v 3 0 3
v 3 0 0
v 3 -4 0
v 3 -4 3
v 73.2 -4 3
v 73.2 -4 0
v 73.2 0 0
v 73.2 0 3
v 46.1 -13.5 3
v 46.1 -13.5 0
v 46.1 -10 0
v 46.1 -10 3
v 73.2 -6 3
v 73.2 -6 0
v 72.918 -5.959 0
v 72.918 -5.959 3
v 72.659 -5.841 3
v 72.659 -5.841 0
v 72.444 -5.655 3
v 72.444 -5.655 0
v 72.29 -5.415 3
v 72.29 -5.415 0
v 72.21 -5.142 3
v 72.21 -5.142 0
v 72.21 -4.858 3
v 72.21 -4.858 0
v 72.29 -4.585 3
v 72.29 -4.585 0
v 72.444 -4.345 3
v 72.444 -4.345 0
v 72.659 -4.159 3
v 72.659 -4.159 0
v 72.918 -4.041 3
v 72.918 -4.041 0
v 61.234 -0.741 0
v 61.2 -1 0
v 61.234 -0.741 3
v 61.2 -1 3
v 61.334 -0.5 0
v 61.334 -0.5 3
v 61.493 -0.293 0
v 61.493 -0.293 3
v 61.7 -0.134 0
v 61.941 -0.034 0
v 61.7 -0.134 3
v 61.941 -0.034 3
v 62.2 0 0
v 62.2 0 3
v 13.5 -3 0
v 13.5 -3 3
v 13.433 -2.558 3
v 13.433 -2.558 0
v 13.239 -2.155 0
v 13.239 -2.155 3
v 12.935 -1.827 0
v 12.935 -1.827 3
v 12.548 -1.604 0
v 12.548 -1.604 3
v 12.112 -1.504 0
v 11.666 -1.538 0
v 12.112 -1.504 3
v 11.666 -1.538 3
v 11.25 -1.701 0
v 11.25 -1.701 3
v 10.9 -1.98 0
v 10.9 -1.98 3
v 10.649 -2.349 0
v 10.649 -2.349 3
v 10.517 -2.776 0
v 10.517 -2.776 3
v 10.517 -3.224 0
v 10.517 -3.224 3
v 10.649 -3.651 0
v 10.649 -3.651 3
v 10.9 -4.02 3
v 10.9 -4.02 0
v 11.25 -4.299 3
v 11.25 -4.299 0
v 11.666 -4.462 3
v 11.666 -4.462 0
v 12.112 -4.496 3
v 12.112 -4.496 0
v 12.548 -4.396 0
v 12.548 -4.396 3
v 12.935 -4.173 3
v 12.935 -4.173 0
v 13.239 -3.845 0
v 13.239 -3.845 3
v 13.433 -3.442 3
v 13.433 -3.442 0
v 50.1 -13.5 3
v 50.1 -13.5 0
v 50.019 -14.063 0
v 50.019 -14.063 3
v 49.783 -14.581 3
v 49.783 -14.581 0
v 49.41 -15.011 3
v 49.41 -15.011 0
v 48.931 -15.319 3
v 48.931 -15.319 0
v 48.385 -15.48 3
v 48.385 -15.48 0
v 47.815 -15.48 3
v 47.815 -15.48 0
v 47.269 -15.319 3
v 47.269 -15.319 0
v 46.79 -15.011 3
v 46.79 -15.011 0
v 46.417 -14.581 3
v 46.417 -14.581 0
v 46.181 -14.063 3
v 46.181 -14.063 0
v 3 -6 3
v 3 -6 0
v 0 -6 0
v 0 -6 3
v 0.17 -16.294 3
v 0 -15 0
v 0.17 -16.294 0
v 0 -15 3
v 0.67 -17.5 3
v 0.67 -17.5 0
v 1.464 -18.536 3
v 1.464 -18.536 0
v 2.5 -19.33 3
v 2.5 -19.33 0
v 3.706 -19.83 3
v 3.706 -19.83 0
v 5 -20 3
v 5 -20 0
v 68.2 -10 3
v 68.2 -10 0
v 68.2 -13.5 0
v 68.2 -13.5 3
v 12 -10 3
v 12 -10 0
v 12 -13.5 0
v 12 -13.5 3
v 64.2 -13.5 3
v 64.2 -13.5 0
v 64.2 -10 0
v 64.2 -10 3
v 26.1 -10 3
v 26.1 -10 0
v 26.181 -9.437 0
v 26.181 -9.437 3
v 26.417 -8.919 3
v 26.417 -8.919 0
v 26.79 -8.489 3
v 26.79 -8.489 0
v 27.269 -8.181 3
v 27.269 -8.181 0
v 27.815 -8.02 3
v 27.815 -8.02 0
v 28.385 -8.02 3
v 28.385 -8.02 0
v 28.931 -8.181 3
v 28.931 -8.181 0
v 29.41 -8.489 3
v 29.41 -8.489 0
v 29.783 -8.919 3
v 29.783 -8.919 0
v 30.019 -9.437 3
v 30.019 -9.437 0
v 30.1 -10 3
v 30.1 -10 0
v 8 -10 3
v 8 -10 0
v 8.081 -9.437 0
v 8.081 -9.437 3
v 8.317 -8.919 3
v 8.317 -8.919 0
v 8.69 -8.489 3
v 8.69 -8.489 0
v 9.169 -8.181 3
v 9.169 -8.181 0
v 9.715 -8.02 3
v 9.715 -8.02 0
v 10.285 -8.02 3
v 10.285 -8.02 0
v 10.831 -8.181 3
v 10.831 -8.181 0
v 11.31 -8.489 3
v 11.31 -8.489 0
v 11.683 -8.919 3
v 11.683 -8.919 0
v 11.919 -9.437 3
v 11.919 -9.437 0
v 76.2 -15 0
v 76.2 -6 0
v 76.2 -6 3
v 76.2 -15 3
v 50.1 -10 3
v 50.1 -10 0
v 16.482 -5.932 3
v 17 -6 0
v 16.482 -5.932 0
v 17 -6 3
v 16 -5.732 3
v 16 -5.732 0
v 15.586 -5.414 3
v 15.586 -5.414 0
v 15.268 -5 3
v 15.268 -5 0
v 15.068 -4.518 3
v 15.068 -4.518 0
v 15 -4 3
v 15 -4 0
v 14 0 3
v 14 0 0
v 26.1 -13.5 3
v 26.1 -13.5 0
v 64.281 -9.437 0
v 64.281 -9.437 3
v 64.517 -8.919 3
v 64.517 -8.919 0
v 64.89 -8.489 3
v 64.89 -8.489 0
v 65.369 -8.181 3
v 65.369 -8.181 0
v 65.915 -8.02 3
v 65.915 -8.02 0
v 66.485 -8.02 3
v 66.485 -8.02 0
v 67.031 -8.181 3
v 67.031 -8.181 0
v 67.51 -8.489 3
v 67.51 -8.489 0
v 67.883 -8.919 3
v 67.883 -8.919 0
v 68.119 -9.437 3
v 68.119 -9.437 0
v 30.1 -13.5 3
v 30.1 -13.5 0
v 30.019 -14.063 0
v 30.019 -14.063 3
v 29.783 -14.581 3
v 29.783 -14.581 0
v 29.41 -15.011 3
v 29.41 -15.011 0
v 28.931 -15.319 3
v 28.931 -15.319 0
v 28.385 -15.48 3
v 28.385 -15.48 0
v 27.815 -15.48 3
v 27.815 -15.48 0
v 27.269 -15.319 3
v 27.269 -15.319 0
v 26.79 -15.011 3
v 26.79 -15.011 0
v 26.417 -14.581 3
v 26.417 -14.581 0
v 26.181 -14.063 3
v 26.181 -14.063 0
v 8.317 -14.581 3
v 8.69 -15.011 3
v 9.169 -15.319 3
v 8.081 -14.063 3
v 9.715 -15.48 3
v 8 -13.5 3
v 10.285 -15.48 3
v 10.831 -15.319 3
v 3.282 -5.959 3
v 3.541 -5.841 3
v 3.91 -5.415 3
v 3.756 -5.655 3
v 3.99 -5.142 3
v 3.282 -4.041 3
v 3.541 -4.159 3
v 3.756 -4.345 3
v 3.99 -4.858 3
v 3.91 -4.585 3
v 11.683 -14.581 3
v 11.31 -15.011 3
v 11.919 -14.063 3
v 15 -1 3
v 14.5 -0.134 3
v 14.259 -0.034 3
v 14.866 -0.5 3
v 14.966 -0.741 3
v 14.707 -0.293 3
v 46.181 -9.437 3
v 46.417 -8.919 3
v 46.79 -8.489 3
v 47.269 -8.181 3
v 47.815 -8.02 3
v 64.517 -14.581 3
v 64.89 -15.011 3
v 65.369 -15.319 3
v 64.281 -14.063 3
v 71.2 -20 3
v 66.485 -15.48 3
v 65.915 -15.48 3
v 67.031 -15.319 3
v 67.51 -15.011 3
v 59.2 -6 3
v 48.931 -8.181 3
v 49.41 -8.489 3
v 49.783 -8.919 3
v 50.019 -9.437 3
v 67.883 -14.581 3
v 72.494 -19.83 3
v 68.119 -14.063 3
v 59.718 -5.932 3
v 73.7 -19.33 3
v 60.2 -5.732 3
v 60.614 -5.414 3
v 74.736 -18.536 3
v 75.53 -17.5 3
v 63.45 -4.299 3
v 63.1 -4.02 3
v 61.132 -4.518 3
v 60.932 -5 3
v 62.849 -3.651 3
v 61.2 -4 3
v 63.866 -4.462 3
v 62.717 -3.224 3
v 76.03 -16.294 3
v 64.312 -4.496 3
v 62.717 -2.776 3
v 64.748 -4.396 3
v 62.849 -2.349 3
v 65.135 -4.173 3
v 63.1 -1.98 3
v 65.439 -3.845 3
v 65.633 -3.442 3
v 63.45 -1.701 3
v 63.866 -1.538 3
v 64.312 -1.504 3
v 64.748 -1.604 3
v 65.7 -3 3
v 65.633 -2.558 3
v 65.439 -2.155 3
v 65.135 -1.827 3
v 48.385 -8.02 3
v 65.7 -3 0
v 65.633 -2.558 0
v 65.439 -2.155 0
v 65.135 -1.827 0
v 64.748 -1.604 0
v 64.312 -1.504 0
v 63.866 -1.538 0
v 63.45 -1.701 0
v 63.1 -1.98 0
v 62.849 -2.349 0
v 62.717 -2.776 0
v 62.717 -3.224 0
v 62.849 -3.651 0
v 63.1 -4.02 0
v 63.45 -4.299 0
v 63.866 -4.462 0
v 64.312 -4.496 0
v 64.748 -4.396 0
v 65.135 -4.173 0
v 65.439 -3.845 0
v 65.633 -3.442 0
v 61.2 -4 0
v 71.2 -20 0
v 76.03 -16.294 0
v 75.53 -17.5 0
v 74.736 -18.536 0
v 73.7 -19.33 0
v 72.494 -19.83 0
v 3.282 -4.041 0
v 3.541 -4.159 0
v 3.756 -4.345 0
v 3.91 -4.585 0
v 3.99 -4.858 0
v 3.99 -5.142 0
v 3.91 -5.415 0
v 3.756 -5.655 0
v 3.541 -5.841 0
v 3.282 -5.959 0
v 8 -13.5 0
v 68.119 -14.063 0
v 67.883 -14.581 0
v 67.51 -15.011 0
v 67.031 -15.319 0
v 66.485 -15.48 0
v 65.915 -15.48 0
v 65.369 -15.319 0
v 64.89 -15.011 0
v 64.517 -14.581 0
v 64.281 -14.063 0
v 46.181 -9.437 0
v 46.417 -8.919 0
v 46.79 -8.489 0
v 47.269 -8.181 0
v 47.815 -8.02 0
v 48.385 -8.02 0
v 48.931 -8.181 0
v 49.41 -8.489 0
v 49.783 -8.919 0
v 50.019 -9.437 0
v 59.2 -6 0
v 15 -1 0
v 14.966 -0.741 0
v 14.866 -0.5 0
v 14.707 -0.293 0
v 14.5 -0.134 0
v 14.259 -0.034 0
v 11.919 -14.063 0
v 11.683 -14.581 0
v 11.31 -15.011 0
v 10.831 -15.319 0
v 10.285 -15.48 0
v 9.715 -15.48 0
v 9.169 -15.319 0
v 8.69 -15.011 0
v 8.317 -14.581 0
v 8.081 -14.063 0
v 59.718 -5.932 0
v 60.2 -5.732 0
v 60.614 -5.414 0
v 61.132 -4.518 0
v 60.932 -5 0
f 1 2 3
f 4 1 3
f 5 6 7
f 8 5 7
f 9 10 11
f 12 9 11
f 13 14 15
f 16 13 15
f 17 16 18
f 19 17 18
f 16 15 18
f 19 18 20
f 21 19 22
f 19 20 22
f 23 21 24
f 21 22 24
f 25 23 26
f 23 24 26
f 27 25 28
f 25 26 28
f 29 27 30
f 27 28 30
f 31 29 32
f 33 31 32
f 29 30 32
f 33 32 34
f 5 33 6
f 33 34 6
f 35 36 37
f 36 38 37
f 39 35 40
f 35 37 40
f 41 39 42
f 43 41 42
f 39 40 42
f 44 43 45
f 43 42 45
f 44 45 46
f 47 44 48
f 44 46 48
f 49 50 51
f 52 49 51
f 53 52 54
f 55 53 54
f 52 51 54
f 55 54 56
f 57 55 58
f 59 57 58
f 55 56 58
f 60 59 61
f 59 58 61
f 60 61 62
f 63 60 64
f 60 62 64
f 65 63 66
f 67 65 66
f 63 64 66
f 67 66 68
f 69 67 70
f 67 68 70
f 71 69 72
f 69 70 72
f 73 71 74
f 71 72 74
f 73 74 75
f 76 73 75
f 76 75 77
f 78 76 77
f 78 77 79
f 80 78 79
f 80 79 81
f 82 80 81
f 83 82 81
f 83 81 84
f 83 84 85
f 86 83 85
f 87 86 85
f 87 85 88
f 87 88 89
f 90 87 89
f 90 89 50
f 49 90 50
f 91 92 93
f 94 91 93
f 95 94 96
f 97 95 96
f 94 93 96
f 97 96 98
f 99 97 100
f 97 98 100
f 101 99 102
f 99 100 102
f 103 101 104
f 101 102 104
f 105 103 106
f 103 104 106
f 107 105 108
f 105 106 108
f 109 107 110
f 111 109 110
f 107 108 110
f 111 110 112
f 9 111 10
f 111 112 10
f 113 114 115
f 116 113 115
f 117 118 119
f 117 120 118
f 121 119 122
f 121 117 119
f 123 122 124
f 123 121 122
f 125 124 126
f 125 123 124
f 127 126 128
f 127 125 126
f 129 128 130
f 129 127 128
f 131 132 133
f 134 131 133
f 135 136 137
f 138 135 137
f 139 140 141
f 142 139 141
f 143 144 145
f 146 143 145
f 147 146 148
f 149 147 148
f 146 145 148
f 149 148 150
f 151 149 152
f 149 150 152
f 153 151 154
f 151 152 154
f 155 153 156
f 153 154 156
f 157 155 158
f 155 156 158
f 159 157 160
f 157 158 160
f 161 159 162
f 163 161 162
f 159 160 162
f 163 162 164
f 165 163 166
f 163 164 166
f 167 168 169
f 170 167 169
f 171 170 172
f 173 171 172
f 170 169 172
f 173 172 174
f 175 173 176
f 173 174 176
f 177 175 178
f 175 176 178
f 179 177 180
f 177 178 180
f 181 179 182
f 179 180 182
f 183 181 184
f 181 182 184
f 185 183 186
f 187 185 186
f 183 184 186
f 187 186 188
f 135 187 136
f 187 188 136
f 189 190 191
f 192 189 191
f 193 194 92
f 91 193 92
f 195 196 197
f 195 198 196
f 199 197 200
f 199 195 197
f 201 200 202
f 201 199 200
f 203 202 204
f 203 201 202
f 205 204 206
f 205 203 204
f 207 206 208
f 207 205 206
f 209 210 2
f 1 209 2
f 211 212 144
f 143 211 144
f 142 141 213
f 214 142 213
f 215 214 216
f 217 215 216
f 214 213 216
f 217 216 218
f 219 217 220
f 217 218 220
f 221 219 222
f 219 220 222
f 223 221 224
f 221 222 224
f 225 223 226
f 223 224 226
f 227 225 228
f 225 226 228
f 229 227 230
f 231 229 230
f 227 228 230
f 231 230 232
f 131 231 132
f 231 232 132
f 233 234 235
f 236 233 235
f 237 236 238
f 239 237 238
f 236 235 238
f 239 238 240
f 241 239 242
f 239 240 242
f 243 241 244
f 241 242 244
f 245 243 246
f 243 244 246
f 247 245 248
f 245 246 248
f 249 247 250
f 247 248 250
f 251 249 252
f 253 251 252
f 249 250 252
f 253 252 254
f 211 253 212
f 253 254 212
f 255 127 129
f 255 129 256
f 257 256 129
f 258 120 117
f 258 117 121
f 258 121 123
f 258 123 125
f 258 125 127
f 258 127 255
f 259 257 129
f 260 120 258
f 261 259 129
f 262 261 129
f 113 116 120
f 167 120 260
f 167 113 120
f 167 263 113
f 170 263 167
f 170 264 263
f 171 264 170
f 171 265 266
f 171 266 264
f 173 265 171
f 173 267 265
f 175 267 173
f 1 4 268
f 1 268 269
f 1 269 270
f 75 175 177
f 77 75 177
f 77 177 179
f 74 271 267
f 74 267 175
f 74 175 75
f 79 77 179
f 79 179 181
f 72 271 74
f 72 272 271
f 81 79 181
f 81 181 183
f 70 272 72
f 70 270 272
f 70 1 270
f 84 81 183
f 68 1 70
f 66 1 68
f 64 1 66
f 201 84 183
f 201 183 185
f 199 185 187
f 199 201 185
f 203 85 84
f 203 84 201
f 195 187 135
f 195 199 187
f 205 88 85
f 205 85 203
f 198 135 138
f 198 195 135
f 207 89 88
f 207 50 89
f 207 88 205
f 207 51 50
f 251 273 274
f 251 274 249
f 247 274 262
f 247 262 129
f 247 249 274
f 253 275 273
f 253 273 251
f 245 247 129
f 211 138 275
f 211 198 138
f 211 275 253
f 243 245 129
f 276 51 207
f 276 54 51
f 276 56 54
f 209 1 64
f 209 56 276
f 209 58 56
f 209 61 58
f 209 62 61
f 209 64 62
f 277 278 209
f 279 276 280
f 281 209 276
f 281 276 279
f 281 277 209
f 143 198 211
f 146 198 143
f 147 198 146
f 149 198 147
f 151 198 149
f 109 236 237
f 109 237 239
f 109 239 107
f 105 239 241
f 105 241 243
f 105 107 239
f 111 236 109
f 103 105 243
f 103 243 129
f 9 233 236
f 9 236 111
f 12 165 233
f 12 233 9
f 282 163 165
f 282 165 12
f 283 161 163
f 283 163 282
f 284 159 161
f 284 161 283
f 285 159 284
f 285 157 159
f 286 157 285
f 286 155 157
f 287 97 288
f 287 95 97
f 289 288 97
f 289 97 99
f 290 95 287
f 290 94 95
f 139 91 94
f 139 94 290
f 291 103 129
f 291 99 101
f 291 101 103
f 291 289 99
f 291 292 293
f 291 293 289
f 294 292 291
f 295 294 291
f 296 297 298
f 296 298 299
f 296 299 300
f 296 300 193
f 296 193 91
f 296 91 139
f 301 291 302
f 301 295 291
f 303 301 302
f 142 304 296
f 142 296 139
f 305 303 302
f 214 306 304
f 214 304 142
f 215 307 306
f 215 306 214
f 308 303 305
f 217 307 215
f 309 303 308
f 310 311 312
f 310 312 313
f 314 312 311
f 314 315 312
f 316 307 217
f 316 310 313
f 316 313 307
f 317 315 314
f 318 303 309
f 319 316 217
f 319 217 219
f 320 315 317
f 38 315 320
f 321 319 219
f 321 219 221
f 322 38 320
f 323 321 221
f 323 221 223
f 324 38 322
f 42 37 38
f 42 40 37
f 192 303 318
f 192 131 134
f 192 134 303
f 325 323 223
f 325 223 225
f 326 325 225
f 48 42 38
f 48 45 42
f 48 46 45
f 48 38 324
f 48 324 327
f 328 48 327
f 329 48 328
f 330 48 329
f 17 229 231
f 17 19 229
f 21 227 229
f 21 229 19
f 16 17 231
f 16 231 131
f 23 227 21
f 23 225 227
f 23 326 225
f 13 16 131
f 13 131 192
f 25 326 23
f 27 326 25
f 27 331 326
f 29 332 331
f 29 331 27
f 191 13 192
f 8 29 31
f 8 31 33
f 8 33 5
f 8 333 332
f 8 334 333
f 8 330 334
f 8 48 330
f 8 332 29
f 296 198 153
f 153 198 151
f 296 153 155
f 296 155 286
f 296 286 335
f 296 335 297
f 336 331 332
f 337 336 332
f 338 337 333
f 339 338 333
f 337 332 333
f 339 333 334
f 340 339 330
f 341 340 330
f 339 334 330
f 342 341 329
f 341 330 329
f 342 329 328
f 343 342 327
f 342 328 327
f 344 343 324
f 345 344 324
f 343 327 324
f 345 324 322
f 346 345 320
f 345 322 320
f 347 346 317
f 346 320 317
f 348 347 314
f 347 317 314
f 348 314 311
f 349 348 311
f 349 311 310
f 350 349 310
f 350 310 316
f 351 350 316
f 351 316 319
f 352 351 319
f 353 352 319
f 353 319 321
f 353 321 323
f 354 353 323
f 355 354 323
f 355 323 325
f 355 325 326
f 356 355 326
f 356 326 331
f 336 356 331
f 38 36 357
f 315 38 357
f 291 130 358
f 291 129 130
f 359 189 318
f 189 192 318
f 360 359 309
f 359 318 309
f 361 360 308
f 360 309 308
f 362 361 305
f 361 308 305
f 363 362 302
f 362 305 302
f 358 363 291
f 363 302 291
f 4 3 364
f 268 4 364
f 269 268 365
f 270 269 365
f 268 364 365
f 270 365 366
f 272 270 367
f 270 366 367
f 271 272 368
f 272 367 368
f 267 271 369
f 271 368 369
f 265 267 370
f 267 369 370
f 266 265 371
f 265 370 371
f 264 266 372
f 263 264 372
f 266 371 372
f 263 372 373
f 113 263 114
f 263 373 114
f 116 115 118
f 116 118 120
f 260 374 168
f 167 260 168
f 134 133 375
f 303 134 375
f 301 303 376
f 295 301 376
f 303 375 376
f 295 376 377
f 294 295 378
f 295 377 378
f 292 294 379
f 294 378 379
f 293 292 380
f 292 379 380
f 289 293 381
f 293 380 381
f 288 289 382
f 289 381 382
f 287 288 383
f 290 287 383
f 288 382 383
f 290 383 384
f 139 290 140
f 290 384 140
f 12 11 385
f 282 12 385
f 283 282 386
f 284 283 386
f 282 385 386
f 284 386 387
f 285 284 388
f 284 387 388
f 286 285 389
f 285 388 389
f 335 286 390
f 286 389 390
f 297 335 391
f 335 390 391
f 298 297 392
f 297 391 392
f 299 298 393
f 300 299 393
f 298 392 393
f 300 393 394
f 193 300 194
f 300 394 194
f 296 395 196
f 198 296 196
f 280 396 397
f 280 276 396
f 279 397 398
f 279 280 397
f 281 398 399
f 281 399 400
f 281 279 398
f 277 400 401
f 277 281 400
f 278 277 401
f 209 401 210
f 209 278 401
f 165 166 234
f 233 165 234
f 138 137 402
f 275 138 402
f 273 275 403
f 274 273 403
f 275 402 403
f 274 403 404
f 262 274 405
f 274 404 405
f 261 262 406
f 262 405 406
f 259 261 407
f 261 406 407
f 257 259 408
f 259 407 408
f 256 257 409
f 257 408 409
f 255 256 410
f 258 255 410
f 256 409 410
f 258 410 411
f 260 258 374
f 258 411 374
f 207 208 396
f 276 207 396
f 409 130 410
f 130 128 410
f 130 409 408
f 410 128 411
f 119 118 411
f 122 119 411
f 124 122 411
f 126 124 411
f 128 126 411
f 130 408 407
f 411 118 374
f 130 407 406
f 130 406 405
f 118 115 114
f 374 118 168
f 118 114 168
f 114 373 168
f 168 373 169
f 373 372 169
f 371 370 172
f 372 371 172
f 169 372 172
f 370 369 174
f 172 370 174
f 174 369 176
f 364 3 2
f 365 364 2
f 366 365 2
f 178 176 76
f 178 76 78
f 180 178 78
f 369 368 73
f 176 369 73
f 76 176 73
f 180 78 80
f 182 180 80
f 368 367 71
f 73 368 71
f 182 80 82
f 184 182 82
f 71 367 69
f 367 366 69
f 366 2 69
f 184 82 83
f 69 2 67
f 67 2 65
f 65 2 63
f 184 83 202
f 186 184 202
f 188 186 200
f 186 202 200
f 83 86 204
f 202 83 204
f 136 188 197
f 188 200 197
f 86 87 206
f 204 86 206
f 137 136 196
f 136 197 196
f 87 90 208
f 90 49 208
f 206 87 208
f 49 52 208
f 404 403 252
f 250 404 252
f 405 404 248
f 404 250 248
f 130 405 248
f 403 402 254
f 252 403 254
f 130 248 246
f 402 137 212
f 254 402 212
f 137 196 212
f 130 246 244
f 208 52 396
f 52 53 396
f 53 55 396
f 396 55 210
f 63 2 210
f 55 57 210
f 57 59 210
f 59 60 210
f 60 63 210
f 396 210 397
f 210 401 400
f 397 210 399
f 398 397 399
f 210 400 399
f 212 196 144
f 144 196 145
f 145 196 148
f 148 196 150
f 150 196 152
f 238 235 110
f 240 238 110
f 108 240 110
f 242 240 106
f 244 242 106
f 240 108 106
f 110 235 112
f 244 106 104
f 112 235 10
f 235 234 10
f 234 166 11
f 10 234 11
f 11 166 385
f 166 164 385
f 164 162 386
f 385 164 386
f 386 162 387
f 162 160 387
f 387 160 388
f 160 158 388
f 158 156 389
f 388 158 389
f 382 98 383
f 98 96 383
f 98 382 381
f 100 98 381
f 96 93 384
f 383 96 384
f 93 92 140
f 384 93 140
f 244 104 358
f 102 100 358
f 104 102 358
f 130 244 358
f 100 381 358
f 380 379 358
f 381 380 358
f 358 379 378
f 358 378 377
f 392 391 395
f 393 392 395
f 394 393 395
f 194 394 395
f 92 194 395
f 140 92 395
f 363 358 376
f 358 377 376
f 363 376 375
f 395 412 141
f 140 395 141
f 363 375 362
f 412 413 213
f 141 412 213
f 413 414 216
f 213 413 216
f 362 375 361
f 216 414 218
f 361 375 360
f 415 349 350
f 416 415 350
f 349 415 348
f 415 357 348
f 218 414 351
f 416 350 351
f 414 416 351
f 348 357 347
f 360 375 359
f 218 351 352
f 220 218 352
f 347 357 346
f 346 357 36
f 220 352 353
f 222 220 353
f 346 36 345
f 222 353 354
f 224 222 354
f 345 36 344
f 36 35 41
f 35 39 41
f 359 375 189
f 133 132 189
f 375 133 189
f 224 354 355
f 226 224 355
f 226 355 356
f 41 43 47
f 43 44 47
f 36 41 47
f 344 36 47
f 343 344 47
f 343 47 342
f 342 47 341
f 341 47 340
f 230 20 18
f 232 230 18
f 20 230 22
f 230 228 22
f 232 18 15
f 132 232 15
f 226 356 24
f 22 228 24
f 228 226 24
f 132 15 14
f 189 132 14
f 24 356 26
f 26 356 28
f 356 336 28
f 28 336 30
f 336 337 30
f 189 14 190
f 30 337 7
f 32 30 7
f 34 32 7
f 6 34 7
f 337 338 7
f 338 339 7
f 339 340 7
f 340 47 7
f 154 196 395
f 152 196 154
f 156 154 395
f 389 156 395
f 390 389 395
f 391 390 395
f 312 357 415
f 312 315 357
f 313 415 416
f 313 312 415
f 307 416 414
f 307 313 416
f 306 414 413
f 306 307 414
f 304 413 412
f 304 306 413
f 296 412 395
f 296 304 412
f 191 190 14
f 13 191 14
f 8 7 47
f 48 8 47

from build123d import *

# Parameters (mm, degrees)
EXTRUDE_1_DEPTH     = 3
FILLET_1_R          = 2
SKETCH_2_R          = 1.5
CUT_EXTRUDE_1_DEPTH = 10
FILLET_3_R          = 1
SKETCH_3_W          = 76.2
SKETCH_3_H          = 3
EXTRUDE_2_DEPTH     = 3
FILLET_4_R          = 5


# Read off the part's stored shape, not the designer's step: 凸台-拉伸1
with BuildPart() as part:
    # 凸台-拉伸1 outline → 凸台-拉伸1 (new body)
    with BuildSketch(Plane.XY):
        with BuildLine():
            Line((76.2, -17), (76.2, -6))
            Line((76.2, -6), (73.2, -6))
            ThreePointArc((73.2, -6), (72.2, -5), (73.2, -4))
            Line((73.2, -4), (73.2, 0))
            Line((73.2, 0), (61.2, 0))
            Line((61.2, 0), (61.2, -6))
            Line((61.2, -6), (15, -6))
            Line((15, -6), (15, 0))
            Line((15, 0), (3, 0))
            Line((3, 0), (3, -4))
            ThreePointArc((3, -4), (4, -5), (3, -6))
            Line((3, -6), (0, -6))
            Line((0, -6), (0, -17))
            Line((0, -17), (76.2, -17))
        make_face()
        with BuildLine():
            Line((12, -10), (12, -13.5))
            ThreePointArc((12, -13.5), (10, -15.5), (8, -13.5))
            Line((8, -13.5), (8, -10))
            ThreePointArc((8, -10), (10, -8), (12, -10))
        make_face(mode=Mode.SUBTRACT)
        with BuildLine():
            Line((26.1, -13.5), (26.1, -10))
            ThreePointArc((26.1, -10), (28.1, -8), (30.1, -10))
            Line((30.1, -10), (30.1, -13.5))
            ThreePointArc((30.1, -13.5), (28.1, -15.5), (26.1, -13.5))
        make_face(mode=Mode.SUBTRACT)
        with BuildLine():
            Line((46.1, -13.5), (46.1, -10))
            ThreePointArc((46.1, -10), (48.1, -8), (50.1, -10))
            Line((50.1, -10), (50.1, -13.5))
            ThreePointArc((50.1, -13.5), (48.1, -15.5), (46.1, -13.5))
        make_face(mode=Mode.SUBTRACT)
        with BuildLine():
            Line((68.2, -10), (68.2, -13.5))
            ThreePointArc((68.2, -13.5), (66.2, -15.5), (64.2, -13.5))
            Line((64.2, -13.5), (64.2, -10))
            ThreePointArc((64.2, -10), (66.2, -8), (68.2, -10))
        make_face(mode=Mode.SUBTRACT)
    extrude(amount=EXTRUDE_1_DEPTH)

    # 圆角1
    fillet_1_edges = [part.edges().sort_by_distance(p)[0] for p in [
        (15, -6, 1.5),
        (61.2, -6, 1.5),
    ]]
    fillet(fillet_1_edges, radius=FILLET_1_R)

    # 草图2 → 切除-拉伸1 (cut)
    with BuildSketch(Plane.XY.offset(3)):
        with Locations((12, -3)):
            Circle(SKETCH_2_R)
        with Locations((64.2, -3)):
            Circle(SKETCH_2_R)
    extrude(amount=-CUT_EXTRUDE_1_DEPTH, mode=Mode.SUBTRACT)

    # 圆角3
    fillet_3_edges = [part.edges().sort_by_distance(p)[0] for p in [
        (15, 0, 1.5),
        (61.2, 0, 1.5),
    ]]
    fillet(fillet_3_edges, radius=FILLET_3_R)

    # 草图3 → 凸台-拉伸2 (add)
    with BuildSketch(Plane.XZ.offset(17)):
        with Locations((38.1, 1.5)):
            Rectangle(SKETCH_3_W, SKETCH_3_H)
    extrude(amount=EXTRUDE_2_DEPTH)

    # 圆角4
    fillet_4_edges = [part.edges().sort_by_distance(p)[0] for p in [
        (0, -20, 1.5),
        (76.2, -20, 1.5),
    ]]
    fillet(fillet_4_edges, radius=FILLET_4_R)


solid = part.part
